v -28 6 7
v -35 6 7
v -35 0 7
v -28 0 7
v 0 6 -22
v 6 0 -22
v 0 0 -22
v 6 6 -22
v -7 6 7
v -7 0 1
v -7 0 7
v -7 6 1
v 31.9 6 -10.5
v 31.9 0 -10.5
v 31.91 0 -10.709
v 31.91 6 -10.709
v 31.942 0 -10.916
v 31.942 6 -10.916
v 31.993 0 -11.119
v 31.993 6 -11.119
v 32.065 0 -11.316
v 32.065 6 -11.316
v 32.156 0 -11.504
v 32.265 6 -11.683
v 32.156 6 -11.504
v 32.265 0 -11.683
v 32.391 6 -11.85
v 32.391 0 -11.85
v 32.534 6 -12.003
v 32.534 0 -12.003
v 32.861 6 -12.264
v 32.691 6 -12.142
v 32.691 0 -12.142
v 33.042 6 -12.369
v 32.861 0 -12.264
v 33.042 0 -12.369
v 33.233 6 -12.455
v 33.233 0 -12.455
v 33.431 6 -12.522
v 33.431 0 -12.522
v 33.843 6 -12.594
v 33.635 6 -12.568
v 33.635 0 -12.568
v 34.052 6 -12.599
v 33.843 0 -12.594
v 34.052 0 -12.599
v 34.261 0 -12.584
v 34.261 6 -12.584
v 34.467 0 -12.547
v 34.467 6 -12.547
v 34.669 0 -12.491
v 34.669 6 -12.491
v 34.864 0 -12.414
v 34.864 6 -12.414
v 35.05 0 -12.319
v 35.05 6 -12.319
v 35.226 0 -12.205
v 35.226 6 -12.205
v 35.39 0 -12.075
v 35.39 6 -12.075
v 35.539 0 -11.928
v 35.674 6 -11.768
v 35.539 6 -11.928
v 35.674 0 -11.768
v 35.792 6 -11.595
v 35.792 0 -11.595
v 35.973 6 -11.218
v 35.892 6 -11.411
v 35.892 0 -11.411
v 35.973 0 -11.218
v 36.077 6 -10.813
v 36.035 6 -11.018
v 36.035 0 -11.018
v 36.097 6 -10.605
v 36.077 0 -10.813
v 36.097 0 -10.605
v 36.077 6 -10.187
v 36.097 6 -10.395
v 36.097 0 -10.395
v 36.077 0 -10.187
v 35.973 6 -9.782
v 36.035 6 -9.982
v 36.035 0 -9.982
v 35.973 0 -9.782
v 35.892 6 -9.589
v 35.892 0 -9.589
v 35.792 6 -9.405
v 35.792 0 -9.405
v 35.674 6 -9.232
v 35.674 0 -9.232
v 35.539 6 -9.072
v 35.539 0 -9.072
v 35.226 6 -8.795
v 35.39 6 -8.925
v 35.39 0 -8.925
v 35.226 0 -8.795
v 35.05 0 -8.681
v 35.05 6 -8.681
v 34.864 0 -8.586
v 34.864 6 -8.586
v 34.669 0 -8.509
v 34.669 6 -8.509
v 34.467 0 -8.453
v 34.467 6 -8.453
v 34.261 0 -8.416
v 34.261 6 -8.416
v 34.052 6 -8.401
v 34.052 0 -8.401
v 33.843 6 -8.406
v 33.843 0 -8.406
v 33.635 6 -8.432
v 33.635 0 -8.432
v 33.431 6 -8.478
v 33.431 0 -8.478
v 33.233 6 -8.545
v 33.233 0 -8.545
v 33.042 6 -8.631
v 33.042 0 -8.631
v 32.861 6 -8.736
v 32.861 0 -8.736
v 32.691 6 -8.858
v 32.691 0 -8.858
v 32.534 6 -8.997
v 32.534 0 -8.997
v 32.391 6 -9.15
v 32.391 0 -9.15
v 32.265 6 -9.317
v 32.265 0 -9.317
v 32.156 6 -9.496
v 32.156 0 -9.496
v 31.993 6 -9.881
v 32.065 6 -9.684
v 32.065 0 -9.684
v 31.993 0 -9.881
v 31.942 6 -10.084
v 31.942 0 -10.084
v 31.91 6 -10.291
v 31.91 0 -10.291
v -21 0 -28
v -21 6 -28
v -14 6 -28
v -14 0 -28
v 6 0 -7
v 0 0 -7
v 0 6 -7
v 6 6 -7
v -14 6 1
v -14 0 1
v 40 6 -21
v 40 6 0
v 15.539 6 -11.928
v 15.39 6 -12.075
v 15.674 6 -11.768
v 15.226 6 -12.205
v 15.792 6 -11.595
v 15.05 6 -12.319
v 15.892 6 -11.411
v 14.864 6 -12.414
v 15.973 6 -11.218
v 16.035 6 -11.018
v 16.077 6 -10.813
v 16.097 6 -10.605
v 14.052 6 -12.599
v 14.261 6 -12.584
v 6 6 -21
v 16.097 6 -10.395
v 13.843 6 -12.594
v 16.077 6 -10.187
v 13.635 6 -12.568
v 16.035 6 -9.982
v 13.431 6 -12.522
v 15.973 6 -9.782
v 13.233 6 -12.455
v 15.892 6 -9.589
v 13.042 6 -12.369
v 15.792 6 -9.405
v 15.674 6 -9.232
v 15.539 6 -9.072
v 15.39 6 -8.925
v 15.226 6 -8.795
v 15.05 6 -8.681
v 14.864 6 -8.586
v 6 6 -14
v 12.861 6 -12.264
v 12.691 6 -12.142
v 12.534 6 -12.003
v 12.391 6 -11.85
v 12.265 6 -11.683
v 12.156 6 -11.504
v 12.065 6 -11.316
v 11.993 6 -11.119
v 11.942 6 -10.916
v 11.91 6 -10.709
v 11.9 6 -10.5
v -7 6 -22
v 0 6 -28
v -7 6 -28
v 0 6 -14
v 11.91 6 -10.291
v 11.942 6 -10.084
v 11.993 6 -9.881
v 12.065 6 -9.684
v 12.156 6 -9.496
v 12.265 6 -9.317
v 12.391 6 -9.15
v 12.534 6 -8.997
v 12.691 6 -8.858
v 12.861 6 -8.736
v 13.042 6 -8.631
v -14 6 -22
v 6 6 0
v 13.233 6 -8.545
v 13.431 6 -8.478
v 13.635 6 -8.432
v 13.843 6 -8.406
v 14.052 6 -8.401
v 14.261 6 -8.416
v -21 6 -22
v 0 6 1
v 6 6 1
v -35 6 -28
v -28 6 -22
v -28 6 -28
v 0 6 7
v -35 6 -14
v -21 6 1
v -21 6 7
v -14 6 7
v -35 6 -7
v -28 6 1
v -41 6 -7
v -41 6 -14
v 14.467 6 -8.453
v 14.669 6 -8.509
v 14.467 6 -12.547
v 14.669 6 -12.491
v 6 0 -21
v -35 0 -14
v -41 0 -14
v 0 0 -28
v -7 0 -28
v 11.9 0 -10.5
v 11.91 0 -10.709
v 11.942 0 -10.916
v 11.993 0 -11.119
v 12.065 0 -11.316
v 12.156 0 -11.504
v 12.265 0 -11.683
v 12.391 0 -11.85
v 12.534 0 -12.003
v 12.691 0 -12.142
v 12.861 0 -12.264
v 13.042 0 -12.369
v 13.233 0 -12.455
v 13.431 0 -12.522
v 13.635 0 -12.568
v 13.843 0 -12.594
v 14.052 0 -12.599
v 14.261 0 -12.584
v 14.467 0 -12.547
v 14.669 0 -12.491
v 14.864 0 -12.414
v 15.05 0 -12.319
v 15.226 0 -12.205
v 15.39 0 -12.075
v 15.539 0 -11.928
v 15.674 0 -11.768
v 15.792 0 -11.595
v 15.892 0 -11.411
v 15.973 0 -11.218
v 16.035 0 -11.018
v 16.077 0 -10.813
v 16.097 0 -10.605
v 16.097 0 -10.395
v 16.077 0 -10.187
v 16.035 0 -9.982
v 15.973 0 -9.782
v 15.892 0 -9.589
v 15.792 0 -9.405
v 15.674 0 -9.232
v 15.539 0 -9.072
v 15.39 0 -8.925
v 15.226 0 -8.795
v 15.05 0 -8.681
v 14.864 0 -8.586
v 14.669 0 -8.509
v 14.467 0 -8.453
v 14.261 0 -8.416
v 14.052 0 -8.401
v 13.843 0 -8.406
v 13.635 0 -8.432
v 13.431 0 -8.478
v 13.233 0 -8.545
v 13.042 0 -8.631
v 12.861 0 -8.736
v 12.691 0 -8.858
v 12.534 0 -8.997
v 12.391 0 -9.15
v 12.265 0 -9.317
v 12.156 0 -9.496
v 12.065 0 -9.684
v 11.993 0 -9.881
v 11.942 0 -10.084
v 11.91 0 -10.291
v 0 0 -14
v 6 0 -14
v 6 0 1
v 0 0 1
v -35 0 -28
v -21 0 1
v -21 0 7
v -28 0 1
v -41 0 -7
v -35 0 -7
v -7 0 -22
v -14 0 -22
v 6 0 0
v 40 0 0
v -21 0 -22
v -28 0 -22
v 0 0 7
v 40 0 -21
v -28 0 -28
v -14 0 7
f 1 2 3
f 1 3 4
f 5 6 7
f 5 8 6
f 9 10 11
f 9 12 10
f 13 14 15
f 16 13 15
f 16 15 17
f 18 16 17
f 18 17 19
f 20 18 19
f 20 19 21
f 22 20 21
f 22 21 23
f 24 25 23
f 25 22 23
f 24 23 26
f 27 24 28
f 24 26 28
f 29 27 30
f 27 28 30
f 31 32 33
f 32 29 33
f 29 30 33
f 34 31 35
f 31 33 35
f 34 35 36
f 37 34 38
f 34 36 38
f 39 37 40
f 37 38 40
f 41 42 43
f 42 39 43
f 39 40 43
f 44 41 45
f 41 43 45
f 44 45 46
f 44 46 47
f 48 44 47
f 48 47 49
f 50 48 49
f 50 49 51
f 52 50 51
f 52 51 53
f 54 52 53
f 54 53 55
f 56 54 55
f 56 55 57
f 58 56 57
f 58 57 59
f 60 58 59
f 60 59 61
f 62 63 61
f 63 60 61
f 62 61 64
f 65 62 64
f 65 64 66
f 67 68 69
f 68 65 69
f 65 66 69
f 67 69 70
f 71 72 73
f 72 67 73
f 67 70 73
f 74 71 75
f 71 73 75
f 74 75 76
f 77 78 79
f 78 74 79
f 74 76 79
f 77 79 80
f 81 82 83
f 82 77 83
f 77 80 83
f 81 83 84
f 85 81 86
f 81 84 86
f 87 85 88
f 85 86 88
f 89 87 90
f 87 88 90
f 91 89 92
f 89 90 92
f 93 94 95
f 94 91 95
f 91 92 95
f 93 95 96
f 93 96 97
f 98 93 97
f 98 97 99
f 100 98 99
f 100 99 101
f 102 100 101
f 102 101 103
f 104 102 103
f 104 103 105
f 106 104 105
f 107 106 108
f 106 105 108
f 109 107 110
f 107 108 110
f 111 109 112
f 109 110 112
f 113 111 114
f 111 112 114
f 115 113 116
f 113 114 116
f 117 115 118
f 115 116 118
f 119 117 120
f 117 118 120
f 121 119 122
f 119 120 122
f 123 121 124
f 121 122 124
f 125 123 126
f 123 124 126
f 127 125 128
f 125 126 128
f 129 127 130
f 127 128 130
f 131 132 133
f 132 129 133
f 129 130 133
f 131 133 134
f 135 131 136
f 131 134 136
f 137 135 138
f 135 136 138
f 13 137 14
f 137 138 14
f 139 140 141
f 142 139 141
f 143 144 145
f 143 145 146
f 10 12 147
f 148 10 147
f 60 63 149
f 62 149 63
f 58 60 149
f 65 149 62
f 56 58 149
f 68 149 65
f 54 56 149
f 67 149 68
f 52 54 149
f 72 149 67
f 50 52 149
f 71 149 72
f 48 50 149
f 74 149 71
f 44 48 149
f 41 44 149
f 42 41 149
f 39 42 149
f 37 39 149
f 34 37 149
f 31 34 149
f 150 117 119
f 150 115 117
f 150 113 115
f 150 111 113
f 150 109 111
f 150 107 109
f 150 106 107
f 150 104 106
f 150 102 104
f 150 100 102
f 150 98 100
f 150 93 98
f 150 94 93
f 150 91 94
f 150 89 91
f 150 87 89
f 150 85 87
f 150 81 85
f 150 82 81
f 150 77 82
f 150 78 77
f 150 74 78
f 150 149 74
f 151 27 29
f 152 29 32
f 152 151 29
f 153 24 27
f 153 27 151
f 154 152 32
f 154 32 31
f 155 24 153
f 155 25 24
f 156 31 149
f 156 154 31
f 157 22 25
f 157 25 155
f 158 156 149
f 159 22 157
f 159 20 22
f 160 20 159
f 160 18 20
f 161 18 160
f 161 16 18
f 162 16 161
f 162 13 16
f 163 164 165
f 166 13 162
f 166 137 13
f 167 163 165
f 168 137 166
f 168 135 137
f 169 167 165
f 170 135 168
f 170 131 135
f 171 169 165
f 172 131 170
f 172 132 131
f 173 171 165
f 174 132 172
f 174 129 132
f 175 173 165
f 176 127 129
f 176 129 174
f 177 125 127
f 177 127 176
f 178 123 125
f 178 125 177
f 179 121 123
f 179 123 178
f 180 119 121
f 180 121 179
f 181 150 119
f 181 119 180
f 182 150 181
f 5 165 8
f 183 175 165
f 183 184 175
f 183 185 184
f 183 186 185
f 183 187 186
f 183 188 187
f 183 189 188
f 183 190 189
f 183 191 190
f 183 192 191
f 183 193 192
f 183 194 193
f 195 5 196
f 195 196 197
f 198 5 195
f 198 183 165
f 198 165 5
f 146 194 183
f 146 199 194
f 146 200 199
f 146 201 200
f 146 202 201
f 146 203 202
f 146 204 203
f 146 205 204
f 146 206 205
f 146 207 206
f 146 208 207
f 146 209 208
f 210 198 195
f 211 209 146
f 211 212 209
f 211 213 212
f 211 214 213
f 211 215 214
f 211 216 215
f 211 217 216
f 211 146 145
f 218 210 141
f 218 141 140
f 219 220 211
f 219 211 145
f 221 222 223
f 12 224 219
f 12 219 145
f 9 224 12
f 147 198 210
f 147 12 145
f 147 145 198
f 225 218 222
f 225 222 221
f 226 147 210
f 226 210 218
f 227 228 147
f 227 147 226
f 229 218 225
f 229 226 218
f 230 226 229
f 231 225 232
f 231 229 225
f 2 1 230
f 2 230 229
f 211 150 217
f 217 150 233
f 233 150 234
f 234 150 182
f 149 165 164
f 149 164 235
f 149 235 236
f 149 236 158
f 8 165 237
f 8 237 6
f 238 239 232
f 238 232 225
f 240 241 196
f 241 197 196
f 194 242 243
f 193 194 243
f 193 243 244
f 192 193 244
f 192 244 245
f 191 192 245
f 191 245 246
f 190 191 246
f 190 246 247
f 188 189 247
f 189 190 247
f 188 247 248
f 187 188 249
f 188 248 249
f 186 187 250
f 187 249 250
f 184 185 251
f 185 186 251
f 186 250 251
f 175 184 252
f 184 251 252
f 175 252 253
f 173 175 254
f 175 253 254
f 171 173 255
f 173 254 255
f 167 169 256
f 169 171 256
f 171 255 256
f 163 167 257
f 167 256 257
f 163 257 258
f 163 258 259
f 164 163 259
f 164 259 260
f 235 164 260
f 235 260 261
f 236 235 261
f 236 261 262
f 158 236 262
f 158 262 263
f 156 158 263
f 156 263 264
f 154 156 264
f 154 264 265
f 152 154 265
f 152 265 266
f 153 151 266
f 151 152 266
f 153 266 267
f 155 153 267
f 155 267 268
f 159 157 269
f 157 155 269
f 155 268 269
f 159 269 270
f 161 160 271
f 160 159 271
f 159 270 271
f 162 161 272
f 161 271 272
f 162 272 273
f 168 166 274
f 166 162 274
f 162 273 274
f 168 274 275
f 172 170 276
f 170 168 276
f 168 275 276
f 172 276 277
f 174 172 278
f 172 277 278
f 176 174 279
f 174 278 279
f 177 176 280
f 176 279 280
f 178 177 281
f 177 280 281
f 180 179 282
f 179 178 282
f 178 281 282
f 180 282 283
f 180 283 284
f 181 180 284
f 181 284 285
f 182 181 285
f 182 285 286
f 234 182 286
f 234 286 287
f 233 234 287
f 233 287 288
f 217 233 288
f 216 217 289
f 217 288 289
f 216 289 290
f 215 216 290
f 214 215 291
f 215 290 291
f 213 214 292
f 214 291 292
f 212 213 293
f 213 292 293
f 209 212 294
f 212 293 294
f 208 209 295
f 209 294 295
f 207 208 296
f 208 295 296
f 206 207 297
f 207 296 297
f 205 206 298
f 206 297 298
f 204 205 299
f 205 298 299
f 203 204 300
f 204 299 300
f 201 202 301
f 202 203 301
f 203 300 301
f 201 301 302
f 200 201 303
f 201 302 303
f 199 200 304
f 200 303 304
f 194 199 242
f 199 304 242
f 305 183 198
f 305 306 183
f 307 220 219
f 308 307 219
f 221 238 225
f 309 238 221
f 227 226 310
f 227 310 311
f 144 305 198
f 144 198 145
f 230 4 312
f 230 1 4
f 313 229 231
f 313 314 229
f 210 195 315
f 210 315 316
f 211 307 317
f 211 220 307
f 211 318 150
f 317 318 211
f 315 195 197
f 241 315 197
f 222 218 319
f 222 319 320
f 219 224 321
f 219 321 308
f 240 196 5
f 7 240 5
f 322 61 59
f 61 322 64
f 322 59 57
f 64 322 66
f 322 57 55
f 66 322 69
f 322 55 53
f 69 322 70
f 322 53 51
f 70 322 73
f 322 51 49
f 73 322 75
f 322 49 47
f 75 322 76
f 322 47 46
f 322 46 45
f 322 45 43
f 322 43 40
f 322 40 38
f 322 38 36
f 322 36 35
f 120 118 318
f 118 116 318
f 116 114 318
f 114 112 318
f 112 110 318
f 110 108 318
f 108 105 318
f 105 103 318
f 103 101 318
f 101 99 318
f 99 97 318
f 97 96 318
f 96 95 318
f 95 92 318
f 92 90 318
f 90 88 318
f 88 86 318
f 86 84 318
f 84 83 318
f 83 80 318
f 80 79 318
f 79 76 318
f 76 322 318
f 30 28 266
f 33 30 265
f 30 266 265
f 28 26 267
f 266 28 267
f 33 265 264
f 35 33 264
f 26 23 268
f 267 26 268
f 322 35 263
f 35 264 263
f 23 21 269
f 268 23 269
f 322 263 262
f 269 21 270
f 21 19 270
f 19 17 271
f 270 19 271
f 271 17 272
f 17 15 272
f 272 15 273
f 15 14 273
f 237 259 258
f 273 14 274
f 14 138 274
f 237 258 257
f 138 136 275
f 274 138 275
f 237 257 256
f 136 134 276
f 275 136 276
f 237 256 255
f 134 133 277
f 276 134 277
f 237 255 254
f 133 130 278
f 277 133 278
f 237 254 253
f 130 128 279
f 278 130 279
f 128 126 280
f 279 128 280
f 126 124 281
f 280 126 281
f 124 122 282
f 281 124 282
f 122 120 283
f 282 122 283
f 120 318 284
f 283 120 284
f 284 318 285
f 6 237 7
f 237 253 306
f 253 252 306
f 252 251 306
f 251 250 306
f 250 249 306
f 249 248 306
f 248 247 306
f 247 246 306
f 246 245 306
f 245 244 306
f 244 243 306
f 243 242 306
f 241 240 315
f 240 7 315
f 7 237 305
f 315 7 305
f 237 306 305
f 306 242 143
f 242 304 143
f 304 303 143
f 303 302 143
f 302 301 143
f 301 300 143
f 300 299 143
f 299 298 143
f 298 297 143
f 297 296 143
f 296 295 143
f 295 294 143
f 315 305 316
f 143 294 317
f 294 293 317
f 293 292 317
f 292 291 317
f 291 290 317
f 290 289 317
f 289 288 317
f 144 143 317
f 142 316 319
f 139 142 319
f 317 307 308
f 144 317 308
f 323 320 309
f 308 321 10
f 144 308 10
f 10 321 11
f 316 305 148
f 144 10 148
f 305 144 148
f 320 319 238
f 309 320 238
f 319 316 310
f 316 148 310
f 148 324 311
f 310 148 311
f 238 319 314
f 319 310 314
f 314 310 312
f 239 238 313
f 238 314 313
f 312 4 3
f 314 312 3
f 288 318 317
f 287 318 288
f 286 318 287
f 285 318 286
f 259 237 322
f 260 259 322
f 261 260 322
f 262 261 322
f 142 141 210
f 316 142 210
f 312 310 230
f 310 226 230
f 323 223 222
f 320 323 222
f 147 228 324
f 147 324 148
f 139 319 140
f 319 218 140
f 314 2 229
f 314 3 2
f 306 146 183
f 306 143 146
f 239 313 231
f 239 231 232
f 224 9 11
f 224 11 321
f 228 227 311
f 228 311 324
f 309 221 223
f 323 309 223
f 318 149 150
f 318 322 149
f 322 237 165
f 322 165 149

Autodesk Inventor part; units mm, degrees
ref_plane "YZ Plane" through (0, 0, 0) normal (1, 0, 0) x (0, 1, 0)
ref_plane "XZ Plane" through (0, 0, 0) normal (0, 1, 0) x (-1, 0, 0)
ref_plane "XY Plane" through (0, 0, 0) normal (0, 0, 1) x (1, 0, 0)
sketch "Sketch1" plane through (0, 0, 0) normal (1, 0, 0) x (0, 1, 0)
  point P0 (0, 0)
sketch "Sketch2" plane through (0, 0, 0) normal (0, 1, 0) x (-1, 0, 0)
  line L0 (0, 0) -> (35, 0)
  line L1 (35, -21) -> (0, -21)
  line L2 (35, -7) -> (41, -7)
  line L3 (41, -7) -> (41, -14)
  line L4 (41, -14) -> (35, -14)
  line L5 (35, 0) -> (35, -7)
  line L6 (35, -14) -> (35, -21)
  line L7 (0, -21) -> (-40, -21)
  line L8 (-40, -21) -> (-40, 0)
  line L9 (-40, 0) -> (0, 0)
  circle A0 centre (-34, -10.5) radius 2.1
  circle A1 centre (-14, -10.5) radius 2.1
  line L10 (0, -7) -> (-6, -7)
  line L11 (-6, -7) -> (-6, -14)
  line L12 (-6, -14) -> (0, -14)
  line L13 (0, -14) -> (0, -7)
  dimension "d0" = 35
  dimension "d1" = 21
  dimension "d2" = 7
  dimension "d3" = 6
  dimension "d4" = 7
  dimension "d5" = 40
  dimension "d8" = 4.2
  dimension "d10" = 4.2
  dimension "d11" = 6
  dimension "d12" = 7
extrude "Extrusion1" add sketch "Sketch2" along normal blind 6
sketch "Sketch3" plane through (0, 6, 0) normal (0, 1, 0) x (1, 0, 0)
  line L0 (0, -1) -> (-35, -1)
  line L1 (-35, 0) -> (40, 0) projected
  line L2 (-35, -1) -> (-35, 0)
  line L3 (-35, 21) -> (-35, 14) projected
  line L4 (-35, 21) -> (6, 21)
  line L5 (6, 21) -> (6, 22)
  line L6 (6, 22) -> (-35, 22)
  line L7 (-35, 22) -> (-35, 21)
  line L8 (0, -1) -> (6, -1)
  line L9 (6, -1) -> (6, 0)
  point P0 (0, 0)
  dimension "d15" = 1
  dimension "d17" = 41
  dimension "d18" = 1
  dimension "d21" = 6
extrude "Extrusion2" add sketch "Sketch3" against normal blind 6
sketch "Sketch4" plane through (0, 6, 0) normal (0, 1, 0) x (1, 0, 0)
  line L0 (6, -1) -> (-35, -1) projected
  line L1 (0, -1) -> (-7, -1)
  line L2 (-7, -1) -> (-7, -7)
  line L3 (-7, -7) -> (0, -7)
  line L4 (0, -7) -> (0, -1)
  line L5 (6, 22) -> (-35, 22) projected
  line L6 (0, 22) -> (-7, 22)
  line L7 (-7, 22) -> (-7, 28)
  line L8 (-7, 28) -> (0, 28)
  line L9 (0, 28) -> (0, 22)
  point P0 (0, 0)
  dimension "d22" = 7
  dimension "d23" = 6
  dimension "d24" = 7
  dimension "d25" = 6
extrude "Extrusion3" add sketch "Sketch4" against normal blind 6
pattern_linear "Rectangular Pattern1" count 3 spacing 14 along (-1, 0, 0) of "Extrusion3"
properties part number "g_arm_v_1"
